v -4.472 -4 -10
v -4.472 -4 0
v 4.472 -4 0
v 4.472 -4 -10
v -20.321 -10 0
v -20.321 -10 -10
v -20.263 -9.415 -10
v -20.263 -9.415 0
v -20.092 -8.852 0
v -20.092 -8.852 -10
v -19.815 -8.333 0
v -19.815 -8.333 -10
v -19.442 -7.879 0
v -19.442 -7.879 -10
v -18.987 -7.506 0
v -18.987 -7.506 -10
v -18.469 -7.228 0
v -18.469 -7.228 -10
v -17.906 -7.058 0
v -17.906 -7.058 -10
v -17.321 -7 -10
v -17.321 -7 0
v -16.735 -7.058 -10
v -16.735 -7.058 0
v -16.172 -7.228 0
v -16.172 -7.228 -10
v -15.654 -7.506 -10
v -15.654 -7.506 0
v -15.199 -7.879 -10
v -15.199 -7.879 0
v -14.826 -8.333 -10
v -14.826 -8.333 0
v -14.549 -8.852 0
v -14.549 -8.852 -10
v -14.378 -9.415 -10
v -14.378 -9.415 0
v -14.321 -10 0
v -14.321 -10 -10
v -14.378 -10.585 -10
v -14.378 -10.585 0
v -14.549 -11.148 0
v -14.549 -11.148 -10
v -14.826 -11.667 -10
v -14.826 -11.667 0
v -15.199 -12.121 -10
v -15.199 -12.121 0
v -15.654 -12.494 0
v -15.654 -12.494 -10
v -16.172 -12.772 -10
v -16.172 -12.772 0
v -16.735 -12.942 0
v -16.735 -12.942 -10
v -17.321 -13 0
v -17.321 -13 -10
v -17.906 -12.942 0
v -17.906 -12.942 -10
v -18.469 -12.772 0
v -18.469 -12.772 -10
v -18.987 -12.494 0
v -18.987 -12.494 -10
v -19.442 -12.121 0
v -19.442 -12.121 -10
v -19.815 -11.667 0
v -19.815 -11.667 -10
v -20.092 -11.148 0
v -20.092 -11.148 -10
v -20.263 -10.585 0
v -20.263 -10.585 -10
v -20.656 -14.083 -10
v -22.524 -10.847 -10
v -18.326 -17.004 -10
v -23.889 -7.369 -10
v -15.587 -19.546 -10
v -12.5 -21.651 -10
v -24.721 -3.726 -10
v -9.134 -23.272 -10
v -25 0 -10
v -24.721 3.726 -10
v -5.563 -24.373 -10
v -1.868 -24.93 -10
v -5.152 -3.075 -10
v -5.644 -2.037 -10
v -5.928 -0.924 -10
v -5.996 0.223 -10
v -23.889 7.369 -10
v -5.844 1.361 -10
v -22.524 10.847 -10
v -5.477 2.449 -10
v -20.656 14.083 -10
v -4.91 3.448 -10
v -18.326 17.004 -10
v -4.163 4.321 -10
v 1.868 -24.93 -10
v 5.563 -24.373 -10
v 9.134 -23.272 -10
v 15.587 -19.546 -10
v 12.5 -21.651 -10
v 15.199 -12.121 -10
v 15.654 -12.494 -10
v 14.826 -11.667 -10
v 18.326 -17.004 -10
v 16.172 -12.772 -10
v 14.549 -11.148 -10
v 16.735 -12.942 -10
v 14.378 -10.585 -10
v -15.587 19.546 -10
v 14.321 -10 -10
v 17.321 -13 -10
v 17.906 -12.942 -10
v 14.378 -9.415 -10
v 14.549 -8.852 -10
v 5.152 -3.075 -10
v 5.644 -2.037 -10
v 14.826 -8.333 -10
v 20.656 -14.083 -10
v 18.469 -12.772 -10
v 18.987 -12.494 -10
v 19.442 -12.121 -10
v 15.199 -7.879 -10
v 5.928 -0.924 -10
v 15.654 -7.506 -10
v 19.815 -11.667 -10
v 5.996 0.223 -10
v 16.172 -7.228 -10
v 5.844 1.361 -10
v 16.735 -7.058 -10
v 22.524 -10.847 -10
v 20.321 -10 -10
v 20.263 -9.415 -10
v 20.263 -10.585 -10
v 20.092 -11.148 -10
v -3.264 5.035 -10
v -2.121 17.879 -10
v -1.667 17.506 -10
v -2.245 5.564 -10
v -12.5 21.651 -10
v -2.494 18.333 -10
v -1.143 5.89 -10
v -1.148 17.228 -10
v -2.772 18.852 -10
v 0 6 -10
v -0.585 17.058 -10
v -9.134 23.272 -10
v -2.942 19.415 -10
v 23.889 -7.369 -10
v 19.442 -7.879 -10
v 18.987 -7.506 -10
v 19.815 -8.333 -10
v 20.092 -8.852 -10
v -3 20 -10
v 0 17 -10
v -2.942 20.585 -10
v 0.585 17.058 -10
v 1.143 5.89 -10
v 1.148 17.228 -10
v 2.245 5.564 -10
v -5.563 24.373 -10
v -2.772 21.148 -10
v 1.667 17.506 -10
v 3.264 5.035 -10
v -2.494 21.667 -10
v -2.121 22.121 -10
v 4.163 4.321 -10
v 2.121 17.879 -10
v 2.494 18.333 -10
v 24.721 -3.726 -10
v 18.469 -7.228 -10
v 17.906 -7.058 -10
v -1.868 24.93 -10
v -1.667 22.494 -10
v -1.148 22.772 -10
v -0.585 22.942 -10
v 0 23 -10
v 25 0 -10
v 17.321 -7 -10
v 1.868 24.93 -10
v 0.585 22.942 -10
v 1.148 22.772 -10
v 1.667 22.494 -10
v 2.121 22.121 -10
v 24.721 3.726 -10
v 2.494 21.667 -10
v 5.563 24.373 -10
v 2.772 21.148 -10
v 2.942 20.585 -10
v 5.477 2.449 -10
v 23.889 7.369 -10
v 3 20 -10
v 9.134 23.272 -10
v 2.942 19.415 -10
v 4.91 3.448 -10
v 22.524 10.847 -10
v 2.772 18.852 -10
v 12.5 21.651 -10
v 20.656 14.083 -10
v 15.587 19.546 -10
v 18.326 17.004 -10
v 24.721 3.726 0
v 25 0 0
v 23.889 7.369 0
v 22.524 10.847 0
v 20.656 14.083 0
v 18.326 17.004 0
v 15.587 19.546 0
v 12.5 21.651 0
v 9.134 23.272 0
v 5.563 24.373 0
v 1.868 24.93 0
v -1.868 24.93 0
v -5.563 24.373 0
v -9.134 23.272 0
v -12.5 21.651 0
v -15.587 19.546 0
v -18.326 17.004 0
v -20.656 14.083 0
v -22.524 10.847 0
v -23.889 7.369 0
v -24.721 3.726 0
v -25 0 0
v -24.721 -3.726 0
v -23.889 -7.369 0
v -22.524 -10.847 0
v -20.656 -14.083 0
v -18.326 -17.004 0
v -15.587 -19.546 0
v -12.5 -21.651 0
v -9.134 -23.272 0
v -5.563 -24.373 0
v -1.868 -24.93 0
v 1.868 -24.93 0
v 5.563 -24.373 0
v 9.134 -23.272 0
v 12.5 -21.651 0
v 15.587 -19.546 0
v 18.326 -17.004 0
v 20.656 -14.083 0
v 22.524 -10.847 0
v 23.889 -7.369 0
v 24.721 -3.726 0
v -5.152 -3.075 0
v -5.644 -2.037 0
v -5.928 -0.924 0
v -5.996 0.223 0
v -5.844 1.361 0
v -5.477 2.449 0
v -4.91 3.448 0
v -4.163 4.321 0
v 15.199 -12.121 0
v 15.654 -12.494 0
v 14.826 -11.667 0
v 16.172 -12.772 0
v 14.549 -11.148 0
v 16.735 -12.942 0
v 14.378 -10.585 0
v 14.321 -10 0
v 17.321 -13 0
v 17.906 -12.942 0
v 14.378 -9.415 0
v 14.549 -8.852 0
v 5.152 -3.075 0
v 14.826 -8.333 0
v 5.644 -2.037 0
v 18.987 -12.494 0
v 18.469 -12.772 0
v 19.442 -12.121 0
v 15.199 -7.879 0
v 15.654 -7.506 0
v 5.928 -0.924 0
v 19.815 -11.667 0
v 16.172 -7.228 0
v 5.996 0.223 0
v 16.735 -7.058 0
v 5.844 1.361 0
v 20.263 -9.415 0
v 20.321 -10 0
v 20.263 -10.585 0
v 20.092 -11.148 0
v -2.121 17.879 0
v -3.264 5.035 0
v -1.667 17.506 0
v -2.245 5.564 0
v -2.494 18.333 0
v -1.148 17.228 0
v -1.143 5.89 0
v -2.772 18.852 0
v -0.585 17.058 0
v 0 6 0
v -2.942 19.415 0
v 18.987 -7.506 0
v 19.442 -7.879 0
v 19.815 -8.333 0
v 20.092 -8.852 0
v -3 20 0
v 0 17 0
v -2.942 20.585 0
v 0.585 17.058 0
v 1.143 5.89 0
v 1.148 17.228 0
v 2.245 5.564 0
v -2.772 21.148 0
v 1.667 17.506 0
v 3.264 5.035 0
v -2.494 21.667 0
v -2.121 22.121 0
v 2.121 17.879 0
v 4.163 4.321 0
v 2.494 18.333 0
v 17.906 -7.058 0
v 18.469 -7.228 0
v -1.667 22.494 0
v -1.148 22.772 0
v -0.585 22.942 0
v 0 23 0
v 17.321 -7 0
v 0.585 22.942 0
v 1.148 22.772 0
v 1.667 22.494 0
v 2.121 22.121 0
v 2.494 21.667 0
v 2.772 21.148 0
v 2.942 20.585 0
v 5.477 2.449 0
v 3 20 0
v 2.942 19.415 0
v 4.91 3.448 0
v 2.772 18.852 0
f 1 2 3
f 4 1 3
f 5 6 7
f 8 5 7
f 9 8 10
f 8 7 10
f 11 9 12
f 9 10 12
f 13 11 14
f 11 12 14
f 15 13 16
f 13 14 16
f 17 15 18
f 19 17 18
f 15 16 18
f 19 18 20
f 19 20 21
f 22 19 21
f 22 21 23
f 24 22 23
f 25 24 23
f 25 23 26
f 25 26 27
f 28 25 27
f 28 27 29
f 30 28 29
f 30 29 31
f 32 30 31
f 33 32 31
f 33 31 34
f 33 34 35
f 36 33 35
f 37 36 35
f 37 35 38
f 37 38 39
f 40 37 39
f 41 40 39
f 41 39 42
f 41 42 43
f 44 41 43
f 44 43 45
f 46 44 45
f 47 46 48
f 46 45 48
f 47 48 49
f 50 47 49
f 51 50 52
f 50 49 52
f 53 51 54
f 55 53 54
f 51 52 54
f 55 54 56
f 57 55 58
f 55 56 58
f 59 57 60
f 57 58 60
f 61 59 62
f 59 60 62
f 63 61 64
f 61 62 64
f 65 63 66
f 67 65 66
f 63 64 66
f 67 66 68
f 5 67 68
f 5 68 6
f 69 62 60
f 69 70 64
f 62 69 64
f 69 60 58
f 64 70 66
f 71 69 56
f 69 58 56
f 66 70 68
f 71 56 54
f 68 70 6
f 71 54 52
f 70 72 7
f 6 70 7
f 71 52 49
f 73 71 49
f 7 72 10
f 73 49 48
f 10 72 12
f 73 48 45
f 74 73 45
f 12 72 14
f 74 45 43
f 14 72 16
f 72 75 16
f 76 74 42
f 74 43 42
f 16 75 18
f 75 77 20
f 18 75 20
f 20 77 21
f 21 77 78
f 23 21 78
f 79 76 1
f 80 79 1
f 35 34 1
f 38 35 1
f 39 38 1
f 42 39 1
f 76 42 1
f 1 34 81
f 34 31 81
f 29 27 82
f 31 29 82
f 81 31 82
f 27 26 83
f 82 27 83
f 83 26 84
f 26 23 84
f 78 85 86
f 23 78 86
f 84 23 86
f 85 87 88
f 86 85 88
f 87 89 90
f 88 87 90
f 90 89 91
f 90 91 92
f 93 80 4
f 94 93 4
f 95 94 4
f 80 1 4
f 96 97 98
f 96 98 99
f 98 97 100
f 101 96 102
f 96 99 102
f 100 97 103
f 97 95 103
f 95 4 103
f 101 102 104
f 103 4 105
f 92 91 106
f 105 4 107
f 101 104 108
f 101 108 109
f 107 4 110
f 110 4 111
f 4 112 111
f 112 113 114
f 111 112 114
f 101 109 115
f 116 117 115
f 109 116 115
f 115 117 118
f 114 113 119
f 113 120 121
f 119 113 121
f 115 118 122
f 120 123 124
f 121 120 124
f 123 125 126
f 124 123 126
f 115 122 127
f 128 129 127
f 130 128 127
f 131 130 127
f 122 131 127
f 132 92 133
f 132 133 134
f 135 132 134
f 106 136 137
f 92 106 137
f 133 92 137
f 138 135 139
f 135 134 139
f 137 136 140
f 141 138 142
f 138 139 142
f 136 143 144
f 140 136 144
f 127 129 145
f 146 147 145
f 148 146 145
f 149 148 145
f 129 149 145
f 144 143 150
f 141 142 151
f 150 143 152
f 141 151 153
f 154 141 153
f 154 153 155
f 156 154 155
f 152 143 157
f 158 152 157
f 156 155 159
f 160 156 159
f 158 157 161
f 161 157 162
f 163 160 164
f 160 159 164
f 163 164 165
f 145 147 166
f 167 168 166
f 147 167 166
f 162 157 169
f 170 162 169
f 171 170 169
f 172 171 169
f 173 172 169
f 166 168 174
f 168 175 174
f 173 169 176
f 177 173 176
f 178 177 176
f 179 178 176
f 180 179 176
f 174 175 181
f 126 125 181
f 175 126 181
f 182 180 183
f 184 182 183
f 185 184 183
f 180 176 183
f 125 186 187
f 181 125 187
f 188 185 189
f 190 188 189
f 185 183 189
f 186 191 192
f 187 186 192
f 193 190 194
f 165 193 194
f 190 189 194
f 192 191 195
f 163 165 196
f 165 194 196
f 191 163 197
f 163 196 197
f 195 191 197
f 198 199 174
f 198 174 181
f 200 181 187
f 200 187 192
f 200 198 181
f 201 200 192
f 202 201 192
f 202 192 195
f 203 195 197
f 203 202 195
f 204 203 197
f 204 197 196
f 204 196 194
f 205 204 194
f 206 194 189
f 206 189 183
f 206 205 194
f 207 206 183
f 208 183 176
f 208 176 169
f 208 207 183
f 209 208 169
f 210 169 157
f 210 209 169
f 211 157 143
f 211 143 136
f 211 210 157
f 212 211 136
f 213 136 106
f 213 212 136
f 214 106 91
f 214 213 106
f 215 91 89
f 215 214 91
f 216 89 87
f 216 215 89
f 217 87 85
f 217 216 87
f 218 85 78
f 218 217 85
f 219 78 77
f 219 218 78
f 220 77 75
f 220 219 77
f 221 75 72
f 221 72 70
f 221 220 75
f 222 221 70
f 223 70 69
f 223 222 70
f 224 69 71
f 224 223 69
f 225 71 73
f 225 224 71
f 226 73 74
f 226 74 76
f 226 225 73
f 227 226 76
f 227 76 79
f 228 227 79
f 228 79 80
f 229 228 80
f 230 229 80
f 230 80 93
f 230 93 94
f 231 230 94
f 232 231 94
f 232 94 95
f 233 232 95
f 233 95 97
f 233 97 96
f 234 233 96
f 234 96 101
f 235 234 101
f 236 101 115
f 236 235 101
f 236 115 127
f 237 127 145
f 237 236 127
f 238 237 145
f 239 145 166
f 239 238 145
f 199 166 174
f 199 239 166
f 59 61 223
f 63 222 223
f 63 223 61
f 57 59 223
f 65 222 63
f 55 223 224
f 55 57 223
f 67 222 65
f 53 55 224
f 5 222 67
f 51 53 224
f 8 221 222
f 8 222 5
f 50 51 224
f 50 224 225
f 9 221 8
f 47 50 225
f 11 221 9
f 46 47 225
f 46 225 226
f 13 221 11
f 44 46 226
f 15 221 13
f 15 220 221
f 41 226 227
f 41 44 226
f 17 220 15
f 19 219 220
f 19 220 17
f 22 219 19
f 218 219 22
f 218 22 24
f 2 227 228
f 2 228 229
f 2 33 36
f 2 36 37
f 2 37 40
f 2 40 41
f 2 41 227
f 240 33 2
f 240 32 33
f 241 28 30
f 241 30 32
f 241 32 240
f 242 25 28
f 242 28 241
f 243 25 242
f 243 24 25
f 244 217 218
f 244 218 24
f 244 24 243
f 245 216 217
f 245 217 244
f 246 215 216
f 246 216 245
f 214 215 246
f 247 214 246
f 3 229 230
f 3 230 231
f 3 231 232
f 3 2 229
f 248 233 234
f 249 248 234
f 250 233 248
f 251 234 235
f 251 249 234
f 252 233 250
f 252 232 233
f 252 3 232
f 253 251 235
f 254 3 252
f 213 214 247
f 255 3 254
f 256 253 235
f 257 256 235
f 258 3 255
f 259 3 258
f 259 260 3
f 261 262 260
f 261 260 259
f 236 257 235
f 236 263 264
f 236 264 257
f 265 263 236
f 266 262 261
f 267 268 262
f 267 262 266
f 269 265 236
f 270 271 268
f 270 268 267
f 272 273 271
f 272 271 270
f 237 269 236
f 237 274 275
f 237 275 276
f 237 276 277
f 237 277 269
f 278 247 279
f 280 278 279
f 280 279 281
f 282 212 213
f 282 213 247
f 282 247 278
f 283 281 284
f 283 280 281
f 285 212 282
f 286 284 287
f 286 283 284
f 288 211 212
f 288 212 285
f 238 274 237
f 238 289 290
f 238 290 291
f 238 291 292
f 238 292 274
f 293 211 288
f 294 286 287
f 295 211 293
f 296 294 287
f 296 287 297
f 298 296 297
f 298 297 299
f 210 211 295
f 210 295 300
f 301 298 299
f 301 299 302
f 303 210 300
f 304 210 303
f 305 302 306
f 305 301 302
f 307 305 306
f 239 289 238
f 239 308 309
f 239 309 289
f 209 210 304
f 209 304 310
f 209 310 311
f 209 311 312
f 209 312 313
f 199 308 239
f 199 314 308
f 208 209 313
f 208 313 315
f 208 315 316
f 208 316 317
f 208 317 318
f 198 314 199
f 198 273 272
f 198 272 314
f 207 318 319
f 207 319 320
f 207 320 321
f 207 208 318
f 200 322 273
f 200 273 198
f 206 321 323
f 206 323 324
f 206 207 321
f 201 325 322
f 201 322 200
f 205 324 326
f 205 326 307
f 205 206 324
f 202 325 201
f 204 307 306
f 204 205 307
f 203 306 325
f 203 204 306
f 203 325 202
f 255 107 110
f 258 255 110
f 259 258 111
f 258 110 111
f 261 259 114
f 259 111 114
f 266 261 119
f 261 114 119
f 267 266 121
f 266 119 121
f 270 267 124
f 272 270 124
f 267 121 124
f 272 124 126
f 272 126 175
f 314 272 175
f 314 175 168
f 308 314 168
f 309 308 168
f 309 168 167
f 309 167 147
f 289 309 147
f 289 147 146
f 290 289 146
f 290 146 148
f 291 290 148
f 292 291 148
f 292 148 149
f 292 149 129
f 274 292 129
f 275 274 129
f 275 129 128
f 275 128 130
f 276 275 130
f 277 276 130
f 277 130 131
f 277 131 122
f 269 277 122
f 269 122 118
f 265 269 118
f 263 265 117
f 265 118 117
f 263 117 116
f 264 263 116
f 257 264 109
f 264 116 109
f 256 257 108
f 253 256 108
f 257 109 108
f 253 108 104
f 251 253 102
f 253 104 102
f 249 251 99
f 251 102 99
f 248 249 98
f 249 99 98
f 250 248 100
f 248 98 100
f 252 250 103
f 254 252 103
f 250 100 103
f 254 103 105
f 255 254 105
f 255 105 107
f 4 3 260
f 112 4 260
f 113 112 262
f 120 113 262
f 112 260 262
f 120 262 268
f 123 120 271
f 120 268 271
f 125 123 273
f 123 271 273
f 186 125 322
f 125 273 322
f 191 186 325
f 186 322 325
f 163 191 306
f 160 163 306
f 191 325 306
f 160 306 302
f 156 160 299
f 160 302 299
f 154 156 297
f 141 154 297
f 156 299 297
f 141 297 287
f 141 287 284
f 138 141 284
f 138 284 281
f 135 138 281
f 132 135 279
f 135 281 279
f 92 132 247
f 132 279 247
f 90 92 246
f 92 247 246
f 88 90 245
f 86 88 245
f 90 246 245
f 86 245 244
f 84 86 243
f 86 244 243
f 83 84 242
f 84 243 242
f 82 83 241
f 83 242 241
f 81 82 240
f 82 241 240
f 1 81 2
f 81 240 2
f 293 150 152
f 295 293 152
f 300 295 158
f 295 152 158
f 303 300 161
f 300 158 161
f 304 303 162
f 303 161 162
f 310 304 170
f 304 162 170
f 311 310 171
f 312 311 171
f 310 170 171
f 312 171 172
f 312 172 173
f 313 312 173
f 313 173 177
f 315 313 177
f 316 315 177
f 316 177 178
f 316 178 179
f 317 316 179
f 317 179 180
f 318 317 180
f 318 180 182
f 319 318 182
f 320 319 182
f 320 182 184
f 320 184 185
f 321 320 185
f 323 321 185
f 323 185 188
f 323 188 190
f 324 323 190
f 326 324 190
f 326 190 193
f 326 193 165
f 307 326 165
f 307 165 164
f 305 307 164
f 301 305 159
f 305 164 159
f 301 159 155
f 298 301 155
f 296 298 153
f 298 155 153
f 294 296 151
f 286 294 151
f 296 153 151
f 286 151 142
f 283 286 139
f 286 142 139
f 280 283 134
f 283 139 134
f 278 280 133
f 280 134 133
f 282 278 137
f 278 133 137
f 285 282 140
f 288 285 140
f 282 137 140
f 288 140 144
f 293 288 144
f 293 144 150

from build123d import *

# Parameters (mm, degrees)
SKETCH1_R           = 25
BOSS_EXTRUDE1_DEPTH = 10
SKETCH2_R           = 3
CUT_EXTRUDE1_DEPTH  = 11


with BuildPart() as part:
    # Sketch1 → Boss-Extrude1 (new body)
    with BuildSketch(Plane.XY):
        Circle(SKETCH1_R)
        with BuildLine():
            Line((-4.472135955, -4), (4.472135955, -4))
            ThreePointArc((4.472135955, -4), (0, 6), (-4.472135955, -4))
        make_face(mode=Mode.SUBTRACT)
    extrude(amount=-BOSS_EXTRUDE1_DEPTH)

    # Sketch2 → Cut-Extrude1 (cut, through all)
    with BuildSketch(Plane(origin=(0, 0, -10), x_dir=(-1, 0, 0), z_dir=(0, 0, -1))):
        with Locations((0, 20)):
            Circle(SKETCH2_R)
        with Locations((17.320508076, -10)):
            Circle(SKETCH2_R)
        with Locations((-17.320508076, -10)):
            Circle(SKETCH2_R)
    extrude(amount=-CUT_EXTRUDE1_DEPTH, mode=Mode.SUBTRACT)


solid = part.part
